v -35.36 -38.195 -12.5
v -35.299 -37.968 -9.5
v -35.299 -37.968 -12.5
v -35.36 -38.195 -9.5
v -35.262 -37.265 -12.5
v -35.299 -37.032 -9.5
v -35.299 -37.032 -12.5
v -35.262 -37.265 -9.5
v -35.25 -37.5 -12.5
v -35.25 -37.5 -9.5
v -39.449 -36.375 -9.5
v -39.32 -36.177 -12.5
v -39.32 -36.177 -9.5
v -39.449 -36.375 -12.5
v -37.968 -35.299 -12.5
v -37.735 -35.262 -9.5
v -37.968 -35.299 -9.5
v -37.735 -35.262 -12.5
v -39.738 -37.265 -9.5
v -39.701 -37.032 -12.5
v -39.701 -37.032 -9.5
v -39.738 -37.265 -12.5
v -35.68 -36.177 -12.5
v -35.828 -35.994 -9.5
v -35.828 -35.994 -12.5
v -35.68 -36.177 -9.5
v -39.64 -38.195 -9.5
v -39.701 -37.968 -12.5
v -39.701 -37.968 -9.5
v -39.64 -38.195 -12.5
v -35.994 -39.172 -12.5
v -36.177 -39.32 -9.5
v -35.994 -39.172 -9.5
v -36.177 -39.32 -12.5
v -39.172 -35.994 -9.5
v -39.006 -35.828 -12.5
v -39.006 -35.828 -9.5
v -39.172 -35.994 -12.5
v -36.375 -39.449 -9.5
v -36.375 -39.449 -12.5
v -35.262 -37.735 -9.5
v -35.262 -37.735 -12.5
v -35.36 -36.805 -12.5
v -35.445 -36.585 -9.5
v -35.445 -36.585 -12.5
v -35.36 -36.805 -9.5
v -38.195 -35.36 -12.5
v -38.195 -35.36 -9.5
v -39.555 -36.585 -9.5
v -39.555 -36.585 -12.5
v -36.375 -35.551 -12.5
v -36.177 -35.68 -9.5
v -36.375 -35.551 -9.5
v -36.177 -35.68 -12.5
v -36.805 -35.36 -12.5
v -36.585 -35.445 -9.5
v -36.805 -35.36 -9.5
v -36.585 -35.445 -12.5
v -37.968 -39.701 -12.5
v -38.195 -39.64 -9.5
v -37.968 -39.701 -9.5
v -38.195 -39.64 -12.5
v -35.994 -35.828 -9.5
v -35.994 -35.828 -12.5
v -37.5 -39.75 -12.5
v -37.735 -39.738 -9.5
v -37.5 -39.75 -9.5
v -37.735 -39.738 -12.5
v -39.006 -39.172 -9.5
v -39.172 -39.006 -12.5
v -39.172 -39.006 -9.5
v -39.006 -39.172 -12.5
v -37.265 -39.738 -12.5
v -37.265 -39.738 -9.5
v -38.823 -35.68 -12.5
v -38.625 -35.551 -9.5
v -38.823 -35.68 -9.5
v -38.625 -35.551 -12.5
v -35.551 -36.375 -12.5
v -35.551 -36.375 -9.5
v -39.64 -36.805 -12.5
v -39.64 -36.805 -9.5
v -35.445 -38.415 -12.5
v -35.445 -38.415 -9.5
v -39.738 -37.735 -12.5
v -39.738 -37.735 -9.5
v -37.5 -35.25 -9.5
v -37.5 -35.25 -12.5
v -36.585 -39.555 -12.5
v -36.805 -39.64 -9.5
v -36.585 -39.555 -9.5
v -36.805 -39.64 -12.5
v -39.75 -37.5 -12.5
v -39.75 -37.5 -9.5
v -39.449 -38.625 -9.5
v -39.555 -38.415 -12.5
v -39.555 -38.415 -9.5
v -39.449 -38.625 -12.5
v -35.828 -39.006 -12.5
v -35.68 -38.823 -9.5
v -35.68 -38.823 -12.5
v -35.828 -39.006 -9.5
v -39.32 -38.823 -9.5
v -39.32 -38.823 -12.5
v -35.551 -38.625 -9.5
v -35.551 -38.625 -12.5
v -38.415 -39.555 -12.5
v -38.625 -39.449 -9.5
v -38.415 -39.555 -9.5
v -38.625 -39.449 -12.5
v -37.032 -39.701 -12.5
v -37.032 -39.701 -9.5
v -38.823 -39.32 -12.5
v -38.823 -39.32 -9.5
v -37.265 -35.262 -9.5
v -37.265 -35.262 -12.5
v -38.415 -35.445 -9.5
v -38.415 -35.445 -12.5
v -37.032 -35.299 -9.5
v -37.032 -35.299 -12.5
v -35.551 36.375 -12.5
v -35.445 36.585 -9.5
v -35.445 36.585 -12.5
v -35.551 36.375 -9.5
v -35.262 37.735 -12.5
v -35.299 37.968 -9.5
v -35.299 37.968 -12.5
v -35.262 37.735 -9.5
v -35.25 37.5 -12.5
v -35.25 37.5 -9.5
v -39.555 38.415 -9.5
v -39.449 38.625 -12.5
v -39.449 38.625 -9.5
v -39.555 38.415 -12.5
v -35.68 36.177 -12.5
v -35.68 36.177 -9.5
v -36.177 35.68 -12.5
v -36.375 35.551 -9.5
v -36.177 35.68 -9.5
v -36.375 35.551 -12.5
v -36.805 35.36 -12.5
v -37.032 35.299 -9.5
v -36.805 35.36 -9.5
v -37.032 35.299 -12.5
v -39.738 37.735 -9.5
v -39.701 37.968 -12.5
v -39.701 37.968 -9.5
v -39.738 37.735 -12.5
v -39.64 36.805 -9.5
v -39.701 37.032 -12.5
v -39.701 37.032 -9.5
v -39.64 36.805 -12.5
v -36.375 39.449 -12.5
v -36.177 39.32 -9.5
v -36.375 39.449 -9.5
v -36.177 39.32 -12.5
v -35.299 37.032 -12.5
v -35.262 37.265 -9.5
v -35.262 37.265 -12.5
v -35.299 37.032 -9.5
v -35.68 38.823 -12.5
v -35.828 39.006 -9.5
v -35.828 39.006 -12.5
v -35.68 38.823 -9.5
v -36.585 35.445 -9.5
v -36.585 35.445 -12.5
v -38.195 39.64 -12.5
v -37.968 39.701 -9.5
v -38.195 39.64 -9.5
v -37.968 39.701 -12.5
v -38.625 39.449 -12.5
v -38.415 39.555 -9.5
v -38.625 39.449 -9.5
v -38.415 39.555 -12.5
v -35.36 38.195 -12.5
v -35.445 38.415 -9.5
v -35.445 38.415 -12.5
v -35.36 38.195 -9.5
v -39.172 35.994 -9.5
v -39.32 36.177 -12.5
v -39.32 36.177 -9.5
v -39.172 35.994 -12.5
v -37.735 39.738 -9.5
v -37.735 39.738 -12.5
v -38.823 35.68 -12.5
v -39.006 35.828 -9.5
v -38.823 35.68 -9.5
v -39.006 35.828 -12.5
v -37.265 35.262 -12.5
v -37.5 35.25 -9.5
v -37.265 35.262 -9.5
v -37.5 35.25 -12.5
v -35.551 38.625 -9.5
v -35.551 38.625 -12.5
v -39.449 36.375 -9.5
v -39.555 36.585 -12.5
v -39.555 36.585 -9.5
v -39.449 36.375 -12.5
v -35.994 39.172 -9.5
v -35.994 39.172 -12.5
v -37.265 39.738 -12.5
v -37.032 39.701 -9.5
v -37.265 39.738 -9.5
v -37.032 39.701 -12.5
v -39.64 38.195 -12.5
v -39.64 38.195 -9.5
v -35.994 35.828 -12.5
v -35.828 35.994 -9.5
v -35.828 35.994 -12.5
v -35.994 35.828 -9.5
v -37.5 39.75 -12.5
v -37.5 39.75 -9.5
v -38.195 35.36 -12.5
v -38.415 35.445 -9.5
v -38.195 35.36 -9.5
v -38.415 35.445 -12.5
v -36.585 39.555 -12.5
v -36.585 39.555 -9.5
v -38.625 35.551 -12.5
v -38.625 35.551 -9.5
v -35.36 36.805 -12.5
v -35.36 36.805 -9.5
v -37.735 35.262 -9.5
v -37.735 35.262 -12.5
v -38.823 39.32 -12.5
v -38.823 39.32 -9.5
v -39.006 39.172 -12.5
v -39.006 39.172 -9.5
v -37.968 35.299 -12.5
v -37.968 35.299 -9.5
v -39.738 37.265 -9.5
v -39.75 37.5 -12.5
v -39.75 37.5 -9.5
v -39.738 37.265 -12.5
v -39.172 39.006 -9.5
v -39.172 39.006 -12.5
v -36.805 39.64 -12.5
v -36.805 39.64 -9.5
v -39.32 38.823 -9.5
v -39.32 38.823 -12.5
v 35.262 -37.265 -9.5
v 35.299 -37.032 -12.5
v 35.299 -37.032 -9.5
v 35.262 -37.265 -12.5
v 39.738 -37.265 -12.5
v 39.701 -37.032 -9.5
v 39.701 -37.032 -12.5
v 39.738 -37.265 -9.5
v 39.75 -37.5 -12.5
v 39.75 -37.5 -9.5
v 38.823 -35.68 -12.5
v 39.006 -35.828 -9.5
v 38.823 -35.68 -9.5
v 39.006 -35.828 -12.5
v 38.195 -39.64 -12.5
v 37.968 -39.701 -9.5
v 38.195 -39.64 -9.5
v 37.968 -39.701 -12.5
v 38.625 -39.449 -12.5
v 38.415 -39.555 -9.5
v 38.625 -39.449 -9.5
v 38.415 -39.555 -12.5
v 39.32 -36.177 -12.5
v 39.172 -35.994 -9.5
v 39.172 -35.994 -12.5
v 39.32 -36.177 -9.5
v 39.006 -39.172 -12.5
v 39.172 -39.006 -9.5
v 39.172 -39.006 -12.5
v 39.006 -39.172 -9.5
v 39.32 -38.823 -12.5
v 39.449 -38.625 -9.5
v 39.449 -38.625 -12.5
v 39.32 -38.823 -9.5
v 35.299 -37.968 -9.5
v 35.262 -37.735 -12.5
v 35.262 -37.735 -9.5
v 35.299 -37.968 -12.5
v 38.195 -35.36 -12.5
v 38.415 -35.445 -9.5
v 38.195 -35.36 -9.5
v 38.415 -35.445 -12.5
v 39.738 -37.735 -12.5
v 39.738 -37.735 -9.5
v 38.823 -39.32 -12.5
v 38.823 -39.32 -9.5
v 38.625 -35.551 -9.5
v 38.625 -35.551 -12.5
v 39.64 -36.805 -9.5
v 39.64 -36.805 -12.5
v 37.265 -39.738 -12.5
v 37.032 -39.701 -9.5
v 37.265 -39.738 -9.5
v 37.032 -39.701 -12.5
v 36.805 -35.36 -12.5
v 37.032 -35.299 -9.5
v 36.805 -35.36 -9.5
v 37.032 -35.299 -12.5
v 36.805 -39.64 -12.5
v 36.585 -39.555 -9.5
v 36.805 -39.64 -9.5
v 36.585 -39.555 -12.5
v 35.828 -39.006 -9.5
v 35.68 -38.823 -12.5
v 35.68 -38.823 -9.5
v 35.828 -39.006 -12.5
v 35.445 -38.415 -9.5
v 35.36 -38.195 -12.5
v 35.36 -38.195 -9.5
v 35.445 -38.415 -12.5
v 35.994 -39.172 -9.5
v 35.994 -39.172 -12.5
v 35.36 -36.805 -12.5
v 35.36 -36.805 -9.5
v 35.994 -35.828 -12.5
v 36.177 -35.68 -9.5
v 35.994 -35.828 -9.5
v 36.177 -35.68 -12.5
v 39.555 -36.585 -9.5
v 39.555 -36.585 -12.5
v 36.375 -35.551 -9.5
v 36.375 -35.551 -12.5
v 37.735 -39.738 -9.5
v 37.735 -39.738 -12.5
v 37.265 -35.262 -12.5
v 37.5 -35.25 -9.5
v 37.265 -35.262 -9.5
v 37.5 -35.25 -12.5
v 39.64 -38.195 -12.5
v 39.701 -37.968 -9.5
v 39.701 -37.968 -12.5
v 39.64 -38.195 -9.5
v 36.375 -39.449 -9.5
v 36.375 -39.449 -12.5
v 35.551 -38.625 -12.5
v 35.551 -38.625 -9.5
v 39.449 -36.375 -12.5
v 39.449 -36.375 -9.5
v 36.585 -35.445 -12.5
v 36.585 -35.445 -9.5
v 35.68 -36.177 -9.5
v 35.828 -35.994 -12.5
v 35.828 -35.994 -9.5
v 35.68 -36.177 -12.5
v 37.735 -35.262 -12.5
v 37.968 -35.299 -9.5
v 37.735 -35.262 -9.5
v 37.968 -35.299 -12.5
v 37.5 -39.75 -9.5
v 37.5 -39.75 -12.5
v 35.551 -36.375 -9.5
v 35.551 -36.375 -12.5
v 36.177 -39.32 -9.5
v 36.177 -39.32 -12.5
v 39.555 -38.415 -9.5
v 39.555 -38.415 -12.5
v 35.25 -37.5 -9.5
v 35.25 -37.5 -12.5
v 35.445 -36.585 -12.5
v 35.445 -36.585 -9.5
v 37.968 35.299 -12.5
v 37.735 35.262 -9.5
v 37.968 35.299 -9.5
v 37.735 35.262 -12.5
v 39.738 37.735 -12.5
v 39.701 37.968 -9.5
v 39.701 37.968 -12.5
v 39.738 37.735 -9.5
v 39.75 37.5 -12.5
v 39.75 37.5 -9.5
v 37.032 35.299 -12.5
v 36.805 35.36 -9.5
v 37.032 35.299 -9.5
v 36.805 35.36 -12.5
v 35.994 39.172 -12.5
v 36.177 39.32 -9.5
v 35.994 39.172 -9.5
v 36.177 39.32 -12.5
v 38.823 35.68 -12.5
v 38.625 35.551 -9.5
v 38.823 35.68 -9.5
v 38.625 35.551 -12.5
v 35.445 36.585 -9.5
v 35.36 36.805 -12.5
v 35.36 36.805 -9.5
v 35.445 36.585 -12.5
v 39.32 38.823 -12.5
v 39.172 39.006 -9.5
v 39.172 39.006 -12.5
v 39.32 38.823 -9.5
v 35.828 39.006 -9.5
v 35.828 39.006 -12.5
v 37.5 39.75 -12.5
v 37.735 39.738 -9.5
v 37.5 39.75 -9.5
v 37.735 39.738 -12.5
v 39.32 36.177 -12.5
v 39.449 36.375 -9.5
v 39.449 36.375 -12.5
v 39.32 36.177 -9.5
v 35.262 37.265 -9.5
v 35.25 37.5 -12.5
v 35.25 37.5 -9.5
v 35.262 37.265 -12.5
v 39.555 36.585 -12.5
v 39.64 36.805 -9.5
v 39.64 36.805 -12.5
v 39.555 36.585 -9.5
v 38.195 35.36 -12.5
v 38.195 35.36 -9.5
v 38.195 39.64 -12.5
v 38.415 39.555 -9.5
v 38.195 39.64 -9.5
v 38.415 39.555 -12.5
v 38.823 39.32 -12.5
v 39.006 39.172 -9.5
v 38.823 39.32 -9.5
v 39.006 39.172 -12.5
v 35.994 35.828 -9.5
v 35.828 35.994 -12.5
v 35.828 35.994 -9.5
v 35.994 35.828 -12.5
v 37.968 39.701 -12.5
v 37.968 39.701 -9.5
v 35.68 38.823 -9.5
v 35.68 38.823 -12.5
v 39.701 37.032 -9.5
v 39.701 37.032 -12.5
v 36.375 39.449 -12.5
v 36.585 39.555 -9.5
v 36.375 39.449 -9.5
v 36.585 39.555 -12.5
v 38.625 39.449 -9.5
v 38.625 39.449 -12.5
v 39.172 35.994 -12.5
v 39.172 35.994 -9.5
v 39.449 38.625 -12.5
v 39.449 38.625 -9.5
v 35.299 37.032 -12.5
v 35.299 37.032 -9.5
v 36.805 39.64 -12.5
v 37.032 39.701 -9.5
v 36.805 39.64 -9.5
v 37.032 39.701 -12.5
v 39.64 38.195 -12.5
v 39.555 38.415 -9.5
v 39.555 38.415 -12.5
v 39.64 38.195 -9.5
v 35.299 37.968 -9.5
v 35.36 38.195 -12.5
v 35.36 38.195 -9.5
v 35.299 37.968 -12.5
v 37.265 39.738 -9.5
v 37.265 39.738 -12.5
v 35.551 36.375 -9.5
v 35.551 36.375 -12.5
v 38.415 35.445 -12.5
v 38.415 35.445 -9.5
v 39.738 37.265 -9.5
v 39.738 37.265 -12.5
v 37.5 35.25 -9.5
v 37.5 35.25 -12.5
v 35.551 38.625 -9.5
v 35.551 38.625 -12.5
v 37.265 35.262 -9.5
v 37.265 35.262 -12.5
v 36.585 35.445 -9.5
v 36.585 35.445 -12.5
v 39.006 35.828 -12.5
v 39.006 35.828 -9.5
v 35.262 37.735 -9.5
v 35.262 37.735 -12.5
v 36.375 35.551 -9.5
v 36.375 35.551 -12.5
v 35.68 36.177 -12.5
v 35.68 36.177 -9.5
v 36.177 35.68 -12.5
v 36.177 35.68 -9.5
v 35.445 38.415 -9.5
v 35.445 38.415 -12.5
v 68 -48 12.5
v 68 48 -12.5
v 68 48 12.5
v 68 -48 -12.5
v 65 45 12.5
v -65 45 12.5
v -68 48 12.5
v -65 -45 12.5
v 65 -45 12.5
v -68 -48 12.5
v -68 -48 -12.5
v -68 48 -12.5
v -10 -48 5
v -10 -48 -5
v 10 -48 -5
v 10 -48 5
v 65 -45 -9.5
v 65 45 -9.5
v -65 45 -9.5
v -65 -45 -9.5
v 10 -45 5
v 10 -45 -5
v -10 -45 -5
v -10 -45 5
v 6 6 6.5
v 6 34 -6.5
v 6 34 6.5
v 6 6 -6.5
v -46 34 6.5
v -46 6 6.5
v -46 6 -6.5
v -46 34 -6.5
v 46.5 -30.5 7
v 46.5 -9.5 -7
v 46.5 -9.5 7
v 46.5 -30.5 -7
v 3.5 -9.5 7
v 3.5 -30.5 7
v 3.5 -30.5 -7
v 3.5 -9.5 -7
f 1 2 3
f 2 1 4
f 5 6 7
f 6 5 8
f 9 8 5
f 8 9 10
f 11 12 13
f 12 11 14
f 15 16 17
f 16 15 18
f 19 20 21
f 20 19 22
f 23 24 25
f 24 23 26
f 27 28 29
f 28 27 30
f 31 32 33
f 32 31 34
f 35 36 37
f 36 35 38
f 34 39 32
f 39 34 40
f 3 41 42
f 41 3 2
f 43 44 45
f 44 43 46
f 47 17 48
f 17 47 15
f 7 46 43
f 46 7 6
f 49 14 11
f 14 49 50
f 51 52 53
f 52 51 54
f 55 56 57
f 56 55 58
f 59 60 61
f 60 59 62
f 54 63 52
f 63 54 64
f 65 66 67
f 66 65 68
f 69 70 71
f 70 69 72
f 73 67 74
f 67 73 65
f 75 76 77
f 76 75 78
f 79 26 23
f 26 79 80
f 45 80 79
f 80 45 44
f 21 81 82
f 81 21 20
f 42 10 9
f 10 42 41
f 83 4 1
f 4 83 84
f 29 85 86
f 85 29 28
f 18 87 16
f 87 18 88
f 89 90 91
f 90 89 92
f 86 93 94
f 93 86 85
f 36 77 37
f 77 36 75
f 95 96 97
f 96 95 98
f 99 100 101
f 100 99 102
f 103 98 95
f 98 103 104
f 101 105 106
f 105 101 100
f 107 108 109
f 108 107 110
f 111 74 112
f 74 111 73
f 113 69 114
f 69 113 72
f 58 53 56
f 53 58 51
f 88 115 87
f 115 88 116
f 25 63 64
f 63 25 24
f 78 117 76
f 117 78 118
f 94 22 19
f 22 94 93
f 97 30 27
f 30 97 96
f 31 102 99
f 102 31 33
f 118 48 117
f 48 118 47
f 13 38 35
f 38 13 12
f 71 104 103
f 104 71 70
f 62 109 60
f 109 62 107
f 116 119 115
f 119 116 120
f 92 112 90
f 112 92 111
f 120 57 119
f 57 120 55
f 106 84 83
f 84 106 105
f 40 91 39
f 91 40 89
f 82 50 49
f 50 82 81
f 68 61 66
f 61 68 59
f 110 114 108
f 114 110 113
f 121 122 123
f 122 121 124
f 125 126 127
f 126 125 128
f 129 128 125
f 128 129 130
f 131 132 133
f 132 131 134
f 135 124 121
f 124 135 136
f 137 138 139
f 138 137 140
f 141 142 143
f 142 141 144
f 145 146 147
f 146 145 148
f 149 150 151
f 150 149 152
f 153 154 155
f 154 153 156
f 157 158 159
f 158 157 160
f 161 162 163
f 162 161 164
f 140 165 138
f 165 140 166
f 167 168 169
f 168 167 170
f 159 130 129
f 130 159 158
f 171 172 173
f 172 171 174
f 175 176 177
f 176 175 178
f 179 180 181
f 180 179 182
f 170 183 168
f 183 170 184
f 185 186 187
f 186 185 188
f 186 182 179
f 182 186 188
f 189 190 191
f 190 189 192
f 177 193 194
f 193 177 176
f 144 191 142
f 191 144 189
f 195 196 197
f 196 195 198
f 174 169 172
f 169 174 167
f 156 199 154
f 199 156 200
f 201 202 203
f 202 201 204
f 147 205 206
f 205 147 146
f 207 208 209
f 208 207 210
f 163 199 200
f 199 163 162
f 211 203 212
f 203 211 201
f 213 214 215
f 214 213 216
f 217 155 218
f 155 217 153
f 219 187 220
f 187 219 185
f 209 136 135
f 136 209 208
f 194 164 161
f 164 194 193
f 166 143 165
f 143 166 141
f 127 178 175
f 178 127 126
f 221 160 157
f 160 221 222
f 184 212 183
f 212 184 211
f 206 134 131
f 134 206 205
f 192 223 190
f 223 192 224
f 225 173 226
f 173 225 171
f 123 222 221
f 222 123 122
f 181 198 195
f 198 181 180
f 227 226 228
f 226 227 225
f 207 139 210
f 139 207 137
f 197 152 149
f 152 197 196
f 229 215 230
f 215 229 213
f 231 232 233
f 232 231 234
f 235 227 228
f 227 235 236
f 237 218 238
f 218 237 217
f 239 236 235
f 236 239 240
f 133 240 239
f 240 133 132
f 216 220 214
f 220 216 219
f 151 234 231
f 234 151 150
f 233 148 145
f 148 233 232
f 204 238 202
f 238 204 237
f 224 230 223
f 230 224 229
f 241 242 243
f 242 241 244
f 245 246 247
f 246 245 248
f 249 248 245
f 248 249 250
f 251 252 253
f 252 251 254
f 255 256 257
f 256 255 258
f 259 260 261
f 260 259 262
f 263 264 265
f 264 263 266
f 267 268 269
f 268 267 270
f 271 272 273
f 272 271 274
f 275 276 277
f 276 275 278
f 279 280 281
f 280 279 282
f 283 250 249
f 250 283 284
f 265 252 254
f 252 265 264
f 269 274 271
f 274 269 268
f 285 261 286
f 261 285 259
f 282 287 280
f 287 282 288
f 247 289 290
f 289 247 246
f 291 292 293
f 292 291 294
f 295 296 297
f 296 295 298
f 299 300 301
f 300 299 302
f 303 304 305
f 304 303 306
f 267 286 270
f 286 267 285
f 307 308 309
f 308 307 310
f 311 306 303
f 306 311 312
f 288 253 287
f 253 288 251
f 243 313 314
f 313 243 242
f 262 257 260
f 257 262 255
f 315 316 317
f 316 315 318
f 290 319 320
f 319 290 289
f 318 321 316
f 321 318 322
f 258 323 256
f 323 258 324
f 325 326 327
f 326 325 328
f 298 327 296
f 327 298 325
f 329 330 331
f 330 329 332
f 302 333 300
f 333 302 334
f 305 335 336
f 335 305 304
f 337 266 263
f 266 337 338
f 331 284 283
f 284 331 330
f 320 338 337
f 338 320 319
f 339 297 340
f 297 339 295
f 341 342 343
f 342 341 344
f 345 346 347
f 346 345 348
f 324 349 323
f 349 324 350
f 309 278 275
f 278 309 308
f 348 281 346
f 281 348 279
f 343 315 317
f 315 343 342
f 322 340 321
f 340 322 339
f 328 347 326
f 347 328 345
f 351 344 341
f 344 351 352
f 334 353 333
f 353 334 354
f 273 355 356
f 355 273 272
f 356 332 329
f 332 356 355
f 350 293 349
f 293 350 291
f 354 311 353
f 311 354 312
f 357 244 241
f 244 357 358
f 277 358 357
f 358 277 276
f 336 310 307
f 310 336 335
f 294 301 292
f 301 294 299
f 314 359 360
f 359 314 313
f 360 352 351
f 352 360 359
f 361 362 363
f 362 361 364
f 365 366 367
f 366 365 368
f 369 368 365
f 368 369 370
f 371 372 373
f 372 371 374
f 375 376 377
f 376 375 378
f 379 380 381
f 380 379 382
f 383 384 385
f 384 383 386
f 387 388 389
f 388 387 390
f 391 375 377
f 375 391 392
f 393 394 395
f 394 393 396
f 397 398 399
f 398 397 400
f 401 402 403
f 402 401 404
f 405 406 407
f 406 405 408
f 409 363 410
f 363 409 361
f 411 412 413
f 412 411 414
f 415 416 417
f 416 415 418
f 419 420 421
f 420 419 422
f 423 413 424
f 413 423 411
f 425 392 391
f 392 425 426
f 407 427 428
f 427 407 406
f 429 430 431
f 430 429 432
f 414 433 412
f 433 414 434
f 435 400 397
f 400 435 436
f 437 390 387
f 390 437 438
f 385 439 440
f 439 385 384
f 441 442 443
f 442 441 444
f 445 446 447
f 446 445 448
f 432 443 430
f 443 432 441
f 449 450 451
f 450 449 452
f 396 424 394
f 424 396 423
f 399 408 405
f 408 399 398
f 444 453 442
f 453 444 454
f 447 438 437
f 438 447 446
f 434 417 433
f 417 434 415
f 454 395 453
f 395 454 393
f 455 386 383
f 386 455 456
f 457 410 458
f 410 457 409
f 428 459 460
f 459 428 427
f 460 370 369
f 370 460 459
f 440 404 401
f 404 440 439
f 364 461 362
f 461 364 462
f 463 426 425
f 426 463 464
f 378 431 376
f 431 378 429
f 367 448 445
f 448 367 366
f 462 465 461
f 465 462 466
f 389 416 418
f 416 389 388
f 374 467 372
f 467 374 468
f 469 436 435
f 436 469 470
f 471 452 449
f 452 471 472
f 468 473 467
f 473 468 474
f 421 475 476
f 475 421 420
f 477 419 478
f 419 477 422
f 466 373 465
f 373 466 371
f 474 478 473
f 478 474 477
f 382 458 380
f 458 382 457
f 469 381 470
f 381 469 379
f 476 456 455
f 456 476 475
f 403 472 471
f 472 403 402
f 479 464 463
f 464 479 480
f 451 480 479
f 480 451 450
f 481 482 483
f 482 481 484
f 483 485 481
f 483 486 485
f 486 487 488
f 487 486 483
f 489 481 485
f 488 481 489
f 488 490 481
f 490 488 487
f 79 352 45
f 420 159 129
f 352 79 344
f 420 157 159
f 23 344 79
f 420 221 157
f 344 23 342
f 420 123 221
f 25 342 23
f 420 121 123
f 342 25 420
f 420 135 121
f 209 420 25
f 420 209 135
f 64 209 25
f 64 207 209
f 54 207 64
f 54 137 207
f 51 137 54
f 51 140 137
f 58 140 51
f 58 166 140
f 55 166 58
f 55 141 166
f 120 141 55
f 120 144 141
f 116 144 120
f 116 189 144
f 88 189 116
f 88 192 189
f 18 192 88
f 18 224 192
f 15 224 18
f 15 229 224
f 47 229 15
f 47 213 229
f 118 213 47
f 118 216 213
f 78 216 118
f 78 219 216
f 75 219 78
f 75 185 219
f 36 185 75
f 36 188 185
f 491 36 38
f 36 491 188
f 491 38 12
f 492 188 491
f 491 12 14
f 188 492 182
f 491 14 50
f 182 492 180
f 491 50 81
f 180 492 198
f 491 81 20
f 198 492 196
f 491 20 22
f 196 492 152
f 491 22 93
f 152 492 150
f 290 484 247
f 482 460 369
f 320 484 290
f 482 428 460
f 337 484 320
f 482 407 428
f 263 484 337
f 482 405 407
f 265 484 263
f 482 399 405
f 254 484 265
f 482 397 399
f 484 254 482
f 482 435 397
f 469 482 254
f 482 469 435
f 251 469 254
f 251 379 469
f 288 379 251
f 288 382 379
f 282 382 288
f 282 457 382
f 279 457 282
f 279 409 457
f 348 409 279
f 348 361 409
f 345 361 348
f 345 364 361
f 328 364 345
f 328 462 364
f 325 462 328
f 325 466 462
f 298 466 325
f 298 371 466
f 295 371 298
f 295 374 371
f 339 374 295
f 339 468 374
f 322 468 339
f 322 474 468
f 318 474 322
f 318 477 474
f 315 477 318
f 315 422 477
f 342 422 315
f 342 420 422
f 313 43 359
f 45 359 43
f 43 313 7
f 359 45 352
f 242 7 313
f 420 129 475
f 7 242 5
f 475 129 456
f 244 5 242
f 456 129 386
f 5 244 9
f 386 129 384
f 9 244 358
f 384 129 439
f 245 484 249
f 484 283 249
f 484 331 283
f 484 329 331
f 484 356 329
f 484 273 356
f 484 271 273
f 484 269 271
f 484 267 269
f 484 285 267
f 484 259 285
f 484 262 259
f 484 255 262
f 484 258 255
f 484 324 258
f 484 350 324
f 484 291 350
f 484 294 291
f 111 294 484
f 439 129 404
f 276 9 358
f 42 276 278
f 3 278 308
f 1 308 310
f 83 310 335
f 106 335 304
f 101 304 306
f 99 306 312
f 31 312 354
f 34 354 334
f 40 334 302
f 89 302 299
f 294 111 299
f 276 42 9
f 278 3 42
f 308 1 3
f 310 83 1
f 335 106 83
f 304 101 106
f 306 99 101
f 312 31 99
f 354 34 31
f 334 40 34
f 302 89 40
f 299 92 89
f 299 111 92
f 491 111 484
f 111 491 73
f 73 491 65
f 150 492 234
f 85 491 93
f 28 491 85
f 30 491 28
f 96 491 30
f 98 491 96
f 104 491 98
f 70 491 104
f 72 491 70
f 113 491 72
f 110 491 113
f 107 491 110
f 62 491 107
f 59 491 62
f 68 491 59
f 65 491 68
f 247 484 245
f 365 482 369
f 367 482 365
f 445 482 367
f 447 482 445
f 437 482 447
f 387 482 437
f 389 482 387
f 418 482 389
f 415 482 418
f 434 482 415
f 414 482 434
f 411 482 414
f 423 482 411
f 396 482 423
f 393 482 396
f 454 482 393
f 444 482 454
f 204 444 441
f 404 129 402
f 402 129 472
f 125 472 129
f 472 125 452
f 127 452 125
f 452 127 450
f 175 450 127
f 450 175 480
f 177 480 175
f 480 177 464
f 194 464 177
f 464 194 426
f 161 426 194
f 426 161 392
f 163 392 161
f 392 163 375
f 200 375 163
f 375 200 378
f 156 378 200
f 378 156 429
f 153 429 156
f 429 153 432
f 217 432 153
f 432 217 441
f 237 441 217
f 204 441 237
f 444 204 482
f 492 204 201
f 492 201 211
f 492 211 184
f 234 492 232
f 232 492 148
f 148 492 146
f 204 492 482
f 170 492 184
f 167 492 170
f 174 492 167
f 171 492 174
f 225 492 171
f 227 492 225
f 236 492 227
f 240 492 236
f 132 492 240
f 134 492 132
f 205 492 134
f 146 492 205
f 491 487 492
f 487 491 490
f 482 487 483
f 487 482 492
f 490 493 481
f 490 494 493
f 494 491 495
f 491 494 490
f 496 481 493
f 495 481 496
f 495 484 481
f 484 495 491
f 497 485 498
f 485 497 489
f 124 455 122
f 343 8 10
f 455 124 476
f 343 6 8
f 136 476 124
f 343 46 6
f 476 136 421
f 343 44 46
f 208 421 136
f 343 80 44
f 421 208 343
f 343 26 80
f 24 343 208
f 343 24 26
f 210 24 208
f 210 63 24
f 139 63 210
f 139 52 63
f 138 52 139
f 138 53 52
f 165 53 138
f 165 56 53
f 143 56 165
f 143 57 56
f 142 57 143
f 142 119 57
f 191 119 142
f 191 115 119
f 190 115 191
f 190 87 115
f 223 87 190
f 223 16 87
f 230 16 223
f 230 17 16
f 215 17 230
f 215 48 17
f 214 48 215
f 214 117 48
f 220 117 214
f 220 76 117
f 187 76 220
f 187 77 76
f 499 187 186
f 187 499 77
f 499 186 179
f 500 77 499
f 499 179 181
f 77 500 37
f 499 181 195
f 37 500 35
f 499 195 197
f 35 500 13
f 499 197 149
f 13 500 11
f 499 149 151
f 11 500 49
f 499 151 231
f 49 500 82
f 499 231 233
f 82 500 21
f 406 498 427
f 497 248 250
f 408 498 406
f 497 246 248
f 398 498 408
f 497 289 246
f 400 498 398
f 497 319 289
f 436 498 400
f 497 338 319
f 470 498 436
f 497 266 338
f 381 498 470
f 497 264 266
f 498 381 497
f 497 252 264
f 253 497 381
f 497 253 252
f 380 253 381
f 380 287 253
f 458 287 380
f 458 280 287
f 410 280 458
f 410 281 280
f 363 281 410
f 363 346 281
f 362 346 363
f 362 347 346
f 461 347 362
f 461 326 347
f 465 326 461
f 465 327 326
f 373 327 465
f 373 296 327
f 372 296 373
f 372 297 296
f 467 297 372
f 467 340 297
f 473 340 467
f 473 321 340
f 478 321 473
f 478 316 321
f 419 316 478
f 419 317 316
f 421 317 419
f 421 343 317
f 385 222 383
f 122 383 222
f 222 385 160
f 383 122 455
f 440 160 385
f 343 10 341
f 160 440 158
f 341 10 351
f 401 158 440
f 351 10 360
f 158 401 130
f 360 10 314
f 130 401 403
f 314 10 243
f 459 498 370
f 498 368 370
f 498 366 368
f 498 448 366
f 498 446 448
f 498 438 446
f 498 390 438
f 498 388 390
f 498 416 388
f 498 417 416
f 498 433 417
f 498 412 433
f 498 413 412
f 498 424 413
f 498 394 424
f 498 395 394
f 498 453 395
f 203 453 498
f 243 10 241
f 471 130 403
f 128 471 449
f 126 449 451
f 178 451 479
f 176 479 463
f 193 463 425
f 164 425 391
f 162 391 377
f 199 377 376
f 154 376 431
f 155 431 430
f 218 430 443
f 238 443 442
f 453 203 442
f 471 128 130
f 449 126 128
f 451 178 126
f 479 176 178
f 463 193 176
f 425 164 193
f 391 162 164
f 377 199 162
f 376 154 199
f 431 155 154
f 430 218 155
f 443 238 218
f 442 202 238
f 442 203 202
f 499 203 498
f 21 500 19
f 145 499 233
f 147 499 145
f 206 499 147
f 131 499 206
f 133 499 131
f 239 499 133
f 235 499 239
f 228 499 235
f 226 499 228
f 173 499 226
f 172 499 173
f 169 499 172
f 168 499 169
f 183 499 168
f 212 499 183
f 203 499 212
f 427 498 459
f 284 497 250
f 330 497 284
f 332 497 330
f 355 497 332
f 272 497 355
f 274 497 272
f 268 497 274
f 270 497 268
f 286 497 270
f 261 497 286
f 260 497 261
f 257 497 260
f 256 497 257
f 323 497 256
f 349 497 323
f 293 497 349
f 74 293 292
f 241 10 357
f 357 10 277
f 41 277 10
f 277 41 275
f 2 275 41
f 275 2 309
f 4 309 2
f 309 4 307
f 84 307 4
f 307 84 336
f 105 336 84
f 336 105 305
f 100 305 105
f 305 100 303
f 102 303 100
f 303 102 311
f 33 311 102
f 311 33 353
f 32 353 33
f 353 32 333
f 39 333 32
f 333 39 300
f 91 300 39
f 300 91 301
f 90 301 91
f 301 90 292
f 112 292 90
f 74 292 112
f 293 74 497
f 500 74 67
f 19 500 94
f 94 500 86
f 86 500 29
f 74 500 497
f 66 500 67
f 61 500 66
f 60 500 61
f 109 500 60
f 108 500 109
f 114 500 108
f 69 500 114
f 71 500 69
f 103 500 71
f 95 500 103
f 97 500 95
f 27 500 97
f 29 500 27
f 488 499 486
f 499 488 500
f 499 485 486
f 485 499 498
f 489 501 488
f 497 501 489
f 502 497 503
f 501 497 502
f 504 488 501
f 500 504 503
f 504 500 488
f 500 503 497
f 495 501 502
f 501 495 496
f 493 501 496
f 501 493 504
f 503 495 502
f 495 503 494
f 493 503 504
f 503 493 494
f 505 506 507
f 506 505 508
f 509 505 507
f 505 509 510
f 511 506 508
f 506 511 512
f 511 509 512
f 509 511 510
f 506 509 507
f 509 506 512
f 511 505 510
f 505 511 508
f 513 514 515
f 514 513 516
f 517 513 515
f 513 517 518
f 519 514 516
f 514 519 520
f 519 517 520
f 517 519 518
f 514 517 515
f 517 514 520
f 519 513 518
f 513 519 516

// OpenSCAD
// AuraLock2 Universal Enclosure - TDD Parametric CAD
// Compile with OpenSCAD to generate .STL files

/* --- DIMENSIONAL CONSTRAINTS (THE TESTS) --- */
$fn = 60; // Curve resolution
wall_thickness = 3.0; // MJF PA12 minimum sturdy wall

// Universal Base Dimensions (Internal bounds)
base_width = 130;
base_height = 90;
base_depth = 25;

/* --- COMPONENT MOCKUPS (FOR TDD VISUALIZATION) --- */
module ESP32_Mockup() {
    color("black") cube([52, 28, 13], center=true);
}
module BuckConverter_Mockup() {
    color("blue") cube([43, 21, 14], center=true);
}
module LCD_5inch_Mockup() {
    color("grey") cube([121, 76, 4.5], center=true);
}

/* --- THE UNIVERSAL BACKPLATE (WALL MOUNT) --- */
module Universal_Backplate() {
    difference() {
        // Main Outer Box
        cube([base_width + (wall_thickness*2), base_height + (wall_thickness*2), base_depth], center=true);
        
        // Internal Cavity (Testing against bounding boxes)
        translate([0, 0, wall_thickness])
            cube([base_width, base_height, base_depth], center=true);
            
        // Wall Mounting Holes (VESA 75mm spacing for universal wall brackets)
        for (x = [-37.5, 37.5]) {
            for (y = [-37.5, 37.5]) {
                translate([x, y, -base_depth]) cylinder(h=base_depth*3, d=4.5, center=true);
            }
        }
        
        // Wire routing hole (Bottom)
        translate([0, -base_height/2 - wall_thickness, 0])
            cube([20, 10, 10], center=true);
    }
}

/* --- FACEPLATE 1B: PI ZERO + 5" SCREEN --- */
module Faceplate_1B_Pi() {
    difference() {
        // Faceplate base
        cube([base_width + (wall_thickness*2), base_height + (wall_thickness*2), wall_thickness], center=true);
        
        // LCD Active Area Cutout (108 x 64.8 mm)
        cube([108, 64.8, wall_thickness*3], center=true);
    }
    
    // M2.5 Standoffs for the LCD
    for (x = [-56.5, 56.5]) {
        for (y = [-34.0, 34.0]) {
            translate([x, y, wall_thickness/2]) cylinder(h=5, d=5);
        }
    }
}

/* --- FACEPLATE 1C: VESA iPAD MOUNT --- */
module Faceplate_1C_iPad() {
    difference() {
        // Faceplate base
        cube([base_width + (wall_thickness*2), base_height + (wall_thickness*2), wall_thickness], center=true);
        
        // VESA 75mm M4 Screw holes for iPad Bracket
        for (x = [-37.5, 37.5]) {
            for (y = [-37.5, 37.5]) {
                cylinder(h=wall_thickness*3, d=4.5, center=true);
            }
        }
    }
}

/* --- TDD ASSEMBLY (Uncomment the part you want to export as STL) --- */

// 1. Export the Base
// Universal_Backplate();

// 2. Export the Pi Faceplate
// translate([0, 0, base_depth/2 + wall_thickness]) Faceplate_1B_Pi();

// 3. Export the iPad Faceplate
// translate([0, 0, base_depth/2 + wall_thickness]) Faceplate_1C_iPad();

// 4. Test View (See components inside base)
Universal_Backplate();
translate([-20, 20, 0]) ESP32_Mockup();
translate([25, -20, 0]) BuckConverter_Mockup();
%translate([0, 0, base_depth/2 + wall_thickness]) Faceplate_1B_Pi(); // Transparent overlay
